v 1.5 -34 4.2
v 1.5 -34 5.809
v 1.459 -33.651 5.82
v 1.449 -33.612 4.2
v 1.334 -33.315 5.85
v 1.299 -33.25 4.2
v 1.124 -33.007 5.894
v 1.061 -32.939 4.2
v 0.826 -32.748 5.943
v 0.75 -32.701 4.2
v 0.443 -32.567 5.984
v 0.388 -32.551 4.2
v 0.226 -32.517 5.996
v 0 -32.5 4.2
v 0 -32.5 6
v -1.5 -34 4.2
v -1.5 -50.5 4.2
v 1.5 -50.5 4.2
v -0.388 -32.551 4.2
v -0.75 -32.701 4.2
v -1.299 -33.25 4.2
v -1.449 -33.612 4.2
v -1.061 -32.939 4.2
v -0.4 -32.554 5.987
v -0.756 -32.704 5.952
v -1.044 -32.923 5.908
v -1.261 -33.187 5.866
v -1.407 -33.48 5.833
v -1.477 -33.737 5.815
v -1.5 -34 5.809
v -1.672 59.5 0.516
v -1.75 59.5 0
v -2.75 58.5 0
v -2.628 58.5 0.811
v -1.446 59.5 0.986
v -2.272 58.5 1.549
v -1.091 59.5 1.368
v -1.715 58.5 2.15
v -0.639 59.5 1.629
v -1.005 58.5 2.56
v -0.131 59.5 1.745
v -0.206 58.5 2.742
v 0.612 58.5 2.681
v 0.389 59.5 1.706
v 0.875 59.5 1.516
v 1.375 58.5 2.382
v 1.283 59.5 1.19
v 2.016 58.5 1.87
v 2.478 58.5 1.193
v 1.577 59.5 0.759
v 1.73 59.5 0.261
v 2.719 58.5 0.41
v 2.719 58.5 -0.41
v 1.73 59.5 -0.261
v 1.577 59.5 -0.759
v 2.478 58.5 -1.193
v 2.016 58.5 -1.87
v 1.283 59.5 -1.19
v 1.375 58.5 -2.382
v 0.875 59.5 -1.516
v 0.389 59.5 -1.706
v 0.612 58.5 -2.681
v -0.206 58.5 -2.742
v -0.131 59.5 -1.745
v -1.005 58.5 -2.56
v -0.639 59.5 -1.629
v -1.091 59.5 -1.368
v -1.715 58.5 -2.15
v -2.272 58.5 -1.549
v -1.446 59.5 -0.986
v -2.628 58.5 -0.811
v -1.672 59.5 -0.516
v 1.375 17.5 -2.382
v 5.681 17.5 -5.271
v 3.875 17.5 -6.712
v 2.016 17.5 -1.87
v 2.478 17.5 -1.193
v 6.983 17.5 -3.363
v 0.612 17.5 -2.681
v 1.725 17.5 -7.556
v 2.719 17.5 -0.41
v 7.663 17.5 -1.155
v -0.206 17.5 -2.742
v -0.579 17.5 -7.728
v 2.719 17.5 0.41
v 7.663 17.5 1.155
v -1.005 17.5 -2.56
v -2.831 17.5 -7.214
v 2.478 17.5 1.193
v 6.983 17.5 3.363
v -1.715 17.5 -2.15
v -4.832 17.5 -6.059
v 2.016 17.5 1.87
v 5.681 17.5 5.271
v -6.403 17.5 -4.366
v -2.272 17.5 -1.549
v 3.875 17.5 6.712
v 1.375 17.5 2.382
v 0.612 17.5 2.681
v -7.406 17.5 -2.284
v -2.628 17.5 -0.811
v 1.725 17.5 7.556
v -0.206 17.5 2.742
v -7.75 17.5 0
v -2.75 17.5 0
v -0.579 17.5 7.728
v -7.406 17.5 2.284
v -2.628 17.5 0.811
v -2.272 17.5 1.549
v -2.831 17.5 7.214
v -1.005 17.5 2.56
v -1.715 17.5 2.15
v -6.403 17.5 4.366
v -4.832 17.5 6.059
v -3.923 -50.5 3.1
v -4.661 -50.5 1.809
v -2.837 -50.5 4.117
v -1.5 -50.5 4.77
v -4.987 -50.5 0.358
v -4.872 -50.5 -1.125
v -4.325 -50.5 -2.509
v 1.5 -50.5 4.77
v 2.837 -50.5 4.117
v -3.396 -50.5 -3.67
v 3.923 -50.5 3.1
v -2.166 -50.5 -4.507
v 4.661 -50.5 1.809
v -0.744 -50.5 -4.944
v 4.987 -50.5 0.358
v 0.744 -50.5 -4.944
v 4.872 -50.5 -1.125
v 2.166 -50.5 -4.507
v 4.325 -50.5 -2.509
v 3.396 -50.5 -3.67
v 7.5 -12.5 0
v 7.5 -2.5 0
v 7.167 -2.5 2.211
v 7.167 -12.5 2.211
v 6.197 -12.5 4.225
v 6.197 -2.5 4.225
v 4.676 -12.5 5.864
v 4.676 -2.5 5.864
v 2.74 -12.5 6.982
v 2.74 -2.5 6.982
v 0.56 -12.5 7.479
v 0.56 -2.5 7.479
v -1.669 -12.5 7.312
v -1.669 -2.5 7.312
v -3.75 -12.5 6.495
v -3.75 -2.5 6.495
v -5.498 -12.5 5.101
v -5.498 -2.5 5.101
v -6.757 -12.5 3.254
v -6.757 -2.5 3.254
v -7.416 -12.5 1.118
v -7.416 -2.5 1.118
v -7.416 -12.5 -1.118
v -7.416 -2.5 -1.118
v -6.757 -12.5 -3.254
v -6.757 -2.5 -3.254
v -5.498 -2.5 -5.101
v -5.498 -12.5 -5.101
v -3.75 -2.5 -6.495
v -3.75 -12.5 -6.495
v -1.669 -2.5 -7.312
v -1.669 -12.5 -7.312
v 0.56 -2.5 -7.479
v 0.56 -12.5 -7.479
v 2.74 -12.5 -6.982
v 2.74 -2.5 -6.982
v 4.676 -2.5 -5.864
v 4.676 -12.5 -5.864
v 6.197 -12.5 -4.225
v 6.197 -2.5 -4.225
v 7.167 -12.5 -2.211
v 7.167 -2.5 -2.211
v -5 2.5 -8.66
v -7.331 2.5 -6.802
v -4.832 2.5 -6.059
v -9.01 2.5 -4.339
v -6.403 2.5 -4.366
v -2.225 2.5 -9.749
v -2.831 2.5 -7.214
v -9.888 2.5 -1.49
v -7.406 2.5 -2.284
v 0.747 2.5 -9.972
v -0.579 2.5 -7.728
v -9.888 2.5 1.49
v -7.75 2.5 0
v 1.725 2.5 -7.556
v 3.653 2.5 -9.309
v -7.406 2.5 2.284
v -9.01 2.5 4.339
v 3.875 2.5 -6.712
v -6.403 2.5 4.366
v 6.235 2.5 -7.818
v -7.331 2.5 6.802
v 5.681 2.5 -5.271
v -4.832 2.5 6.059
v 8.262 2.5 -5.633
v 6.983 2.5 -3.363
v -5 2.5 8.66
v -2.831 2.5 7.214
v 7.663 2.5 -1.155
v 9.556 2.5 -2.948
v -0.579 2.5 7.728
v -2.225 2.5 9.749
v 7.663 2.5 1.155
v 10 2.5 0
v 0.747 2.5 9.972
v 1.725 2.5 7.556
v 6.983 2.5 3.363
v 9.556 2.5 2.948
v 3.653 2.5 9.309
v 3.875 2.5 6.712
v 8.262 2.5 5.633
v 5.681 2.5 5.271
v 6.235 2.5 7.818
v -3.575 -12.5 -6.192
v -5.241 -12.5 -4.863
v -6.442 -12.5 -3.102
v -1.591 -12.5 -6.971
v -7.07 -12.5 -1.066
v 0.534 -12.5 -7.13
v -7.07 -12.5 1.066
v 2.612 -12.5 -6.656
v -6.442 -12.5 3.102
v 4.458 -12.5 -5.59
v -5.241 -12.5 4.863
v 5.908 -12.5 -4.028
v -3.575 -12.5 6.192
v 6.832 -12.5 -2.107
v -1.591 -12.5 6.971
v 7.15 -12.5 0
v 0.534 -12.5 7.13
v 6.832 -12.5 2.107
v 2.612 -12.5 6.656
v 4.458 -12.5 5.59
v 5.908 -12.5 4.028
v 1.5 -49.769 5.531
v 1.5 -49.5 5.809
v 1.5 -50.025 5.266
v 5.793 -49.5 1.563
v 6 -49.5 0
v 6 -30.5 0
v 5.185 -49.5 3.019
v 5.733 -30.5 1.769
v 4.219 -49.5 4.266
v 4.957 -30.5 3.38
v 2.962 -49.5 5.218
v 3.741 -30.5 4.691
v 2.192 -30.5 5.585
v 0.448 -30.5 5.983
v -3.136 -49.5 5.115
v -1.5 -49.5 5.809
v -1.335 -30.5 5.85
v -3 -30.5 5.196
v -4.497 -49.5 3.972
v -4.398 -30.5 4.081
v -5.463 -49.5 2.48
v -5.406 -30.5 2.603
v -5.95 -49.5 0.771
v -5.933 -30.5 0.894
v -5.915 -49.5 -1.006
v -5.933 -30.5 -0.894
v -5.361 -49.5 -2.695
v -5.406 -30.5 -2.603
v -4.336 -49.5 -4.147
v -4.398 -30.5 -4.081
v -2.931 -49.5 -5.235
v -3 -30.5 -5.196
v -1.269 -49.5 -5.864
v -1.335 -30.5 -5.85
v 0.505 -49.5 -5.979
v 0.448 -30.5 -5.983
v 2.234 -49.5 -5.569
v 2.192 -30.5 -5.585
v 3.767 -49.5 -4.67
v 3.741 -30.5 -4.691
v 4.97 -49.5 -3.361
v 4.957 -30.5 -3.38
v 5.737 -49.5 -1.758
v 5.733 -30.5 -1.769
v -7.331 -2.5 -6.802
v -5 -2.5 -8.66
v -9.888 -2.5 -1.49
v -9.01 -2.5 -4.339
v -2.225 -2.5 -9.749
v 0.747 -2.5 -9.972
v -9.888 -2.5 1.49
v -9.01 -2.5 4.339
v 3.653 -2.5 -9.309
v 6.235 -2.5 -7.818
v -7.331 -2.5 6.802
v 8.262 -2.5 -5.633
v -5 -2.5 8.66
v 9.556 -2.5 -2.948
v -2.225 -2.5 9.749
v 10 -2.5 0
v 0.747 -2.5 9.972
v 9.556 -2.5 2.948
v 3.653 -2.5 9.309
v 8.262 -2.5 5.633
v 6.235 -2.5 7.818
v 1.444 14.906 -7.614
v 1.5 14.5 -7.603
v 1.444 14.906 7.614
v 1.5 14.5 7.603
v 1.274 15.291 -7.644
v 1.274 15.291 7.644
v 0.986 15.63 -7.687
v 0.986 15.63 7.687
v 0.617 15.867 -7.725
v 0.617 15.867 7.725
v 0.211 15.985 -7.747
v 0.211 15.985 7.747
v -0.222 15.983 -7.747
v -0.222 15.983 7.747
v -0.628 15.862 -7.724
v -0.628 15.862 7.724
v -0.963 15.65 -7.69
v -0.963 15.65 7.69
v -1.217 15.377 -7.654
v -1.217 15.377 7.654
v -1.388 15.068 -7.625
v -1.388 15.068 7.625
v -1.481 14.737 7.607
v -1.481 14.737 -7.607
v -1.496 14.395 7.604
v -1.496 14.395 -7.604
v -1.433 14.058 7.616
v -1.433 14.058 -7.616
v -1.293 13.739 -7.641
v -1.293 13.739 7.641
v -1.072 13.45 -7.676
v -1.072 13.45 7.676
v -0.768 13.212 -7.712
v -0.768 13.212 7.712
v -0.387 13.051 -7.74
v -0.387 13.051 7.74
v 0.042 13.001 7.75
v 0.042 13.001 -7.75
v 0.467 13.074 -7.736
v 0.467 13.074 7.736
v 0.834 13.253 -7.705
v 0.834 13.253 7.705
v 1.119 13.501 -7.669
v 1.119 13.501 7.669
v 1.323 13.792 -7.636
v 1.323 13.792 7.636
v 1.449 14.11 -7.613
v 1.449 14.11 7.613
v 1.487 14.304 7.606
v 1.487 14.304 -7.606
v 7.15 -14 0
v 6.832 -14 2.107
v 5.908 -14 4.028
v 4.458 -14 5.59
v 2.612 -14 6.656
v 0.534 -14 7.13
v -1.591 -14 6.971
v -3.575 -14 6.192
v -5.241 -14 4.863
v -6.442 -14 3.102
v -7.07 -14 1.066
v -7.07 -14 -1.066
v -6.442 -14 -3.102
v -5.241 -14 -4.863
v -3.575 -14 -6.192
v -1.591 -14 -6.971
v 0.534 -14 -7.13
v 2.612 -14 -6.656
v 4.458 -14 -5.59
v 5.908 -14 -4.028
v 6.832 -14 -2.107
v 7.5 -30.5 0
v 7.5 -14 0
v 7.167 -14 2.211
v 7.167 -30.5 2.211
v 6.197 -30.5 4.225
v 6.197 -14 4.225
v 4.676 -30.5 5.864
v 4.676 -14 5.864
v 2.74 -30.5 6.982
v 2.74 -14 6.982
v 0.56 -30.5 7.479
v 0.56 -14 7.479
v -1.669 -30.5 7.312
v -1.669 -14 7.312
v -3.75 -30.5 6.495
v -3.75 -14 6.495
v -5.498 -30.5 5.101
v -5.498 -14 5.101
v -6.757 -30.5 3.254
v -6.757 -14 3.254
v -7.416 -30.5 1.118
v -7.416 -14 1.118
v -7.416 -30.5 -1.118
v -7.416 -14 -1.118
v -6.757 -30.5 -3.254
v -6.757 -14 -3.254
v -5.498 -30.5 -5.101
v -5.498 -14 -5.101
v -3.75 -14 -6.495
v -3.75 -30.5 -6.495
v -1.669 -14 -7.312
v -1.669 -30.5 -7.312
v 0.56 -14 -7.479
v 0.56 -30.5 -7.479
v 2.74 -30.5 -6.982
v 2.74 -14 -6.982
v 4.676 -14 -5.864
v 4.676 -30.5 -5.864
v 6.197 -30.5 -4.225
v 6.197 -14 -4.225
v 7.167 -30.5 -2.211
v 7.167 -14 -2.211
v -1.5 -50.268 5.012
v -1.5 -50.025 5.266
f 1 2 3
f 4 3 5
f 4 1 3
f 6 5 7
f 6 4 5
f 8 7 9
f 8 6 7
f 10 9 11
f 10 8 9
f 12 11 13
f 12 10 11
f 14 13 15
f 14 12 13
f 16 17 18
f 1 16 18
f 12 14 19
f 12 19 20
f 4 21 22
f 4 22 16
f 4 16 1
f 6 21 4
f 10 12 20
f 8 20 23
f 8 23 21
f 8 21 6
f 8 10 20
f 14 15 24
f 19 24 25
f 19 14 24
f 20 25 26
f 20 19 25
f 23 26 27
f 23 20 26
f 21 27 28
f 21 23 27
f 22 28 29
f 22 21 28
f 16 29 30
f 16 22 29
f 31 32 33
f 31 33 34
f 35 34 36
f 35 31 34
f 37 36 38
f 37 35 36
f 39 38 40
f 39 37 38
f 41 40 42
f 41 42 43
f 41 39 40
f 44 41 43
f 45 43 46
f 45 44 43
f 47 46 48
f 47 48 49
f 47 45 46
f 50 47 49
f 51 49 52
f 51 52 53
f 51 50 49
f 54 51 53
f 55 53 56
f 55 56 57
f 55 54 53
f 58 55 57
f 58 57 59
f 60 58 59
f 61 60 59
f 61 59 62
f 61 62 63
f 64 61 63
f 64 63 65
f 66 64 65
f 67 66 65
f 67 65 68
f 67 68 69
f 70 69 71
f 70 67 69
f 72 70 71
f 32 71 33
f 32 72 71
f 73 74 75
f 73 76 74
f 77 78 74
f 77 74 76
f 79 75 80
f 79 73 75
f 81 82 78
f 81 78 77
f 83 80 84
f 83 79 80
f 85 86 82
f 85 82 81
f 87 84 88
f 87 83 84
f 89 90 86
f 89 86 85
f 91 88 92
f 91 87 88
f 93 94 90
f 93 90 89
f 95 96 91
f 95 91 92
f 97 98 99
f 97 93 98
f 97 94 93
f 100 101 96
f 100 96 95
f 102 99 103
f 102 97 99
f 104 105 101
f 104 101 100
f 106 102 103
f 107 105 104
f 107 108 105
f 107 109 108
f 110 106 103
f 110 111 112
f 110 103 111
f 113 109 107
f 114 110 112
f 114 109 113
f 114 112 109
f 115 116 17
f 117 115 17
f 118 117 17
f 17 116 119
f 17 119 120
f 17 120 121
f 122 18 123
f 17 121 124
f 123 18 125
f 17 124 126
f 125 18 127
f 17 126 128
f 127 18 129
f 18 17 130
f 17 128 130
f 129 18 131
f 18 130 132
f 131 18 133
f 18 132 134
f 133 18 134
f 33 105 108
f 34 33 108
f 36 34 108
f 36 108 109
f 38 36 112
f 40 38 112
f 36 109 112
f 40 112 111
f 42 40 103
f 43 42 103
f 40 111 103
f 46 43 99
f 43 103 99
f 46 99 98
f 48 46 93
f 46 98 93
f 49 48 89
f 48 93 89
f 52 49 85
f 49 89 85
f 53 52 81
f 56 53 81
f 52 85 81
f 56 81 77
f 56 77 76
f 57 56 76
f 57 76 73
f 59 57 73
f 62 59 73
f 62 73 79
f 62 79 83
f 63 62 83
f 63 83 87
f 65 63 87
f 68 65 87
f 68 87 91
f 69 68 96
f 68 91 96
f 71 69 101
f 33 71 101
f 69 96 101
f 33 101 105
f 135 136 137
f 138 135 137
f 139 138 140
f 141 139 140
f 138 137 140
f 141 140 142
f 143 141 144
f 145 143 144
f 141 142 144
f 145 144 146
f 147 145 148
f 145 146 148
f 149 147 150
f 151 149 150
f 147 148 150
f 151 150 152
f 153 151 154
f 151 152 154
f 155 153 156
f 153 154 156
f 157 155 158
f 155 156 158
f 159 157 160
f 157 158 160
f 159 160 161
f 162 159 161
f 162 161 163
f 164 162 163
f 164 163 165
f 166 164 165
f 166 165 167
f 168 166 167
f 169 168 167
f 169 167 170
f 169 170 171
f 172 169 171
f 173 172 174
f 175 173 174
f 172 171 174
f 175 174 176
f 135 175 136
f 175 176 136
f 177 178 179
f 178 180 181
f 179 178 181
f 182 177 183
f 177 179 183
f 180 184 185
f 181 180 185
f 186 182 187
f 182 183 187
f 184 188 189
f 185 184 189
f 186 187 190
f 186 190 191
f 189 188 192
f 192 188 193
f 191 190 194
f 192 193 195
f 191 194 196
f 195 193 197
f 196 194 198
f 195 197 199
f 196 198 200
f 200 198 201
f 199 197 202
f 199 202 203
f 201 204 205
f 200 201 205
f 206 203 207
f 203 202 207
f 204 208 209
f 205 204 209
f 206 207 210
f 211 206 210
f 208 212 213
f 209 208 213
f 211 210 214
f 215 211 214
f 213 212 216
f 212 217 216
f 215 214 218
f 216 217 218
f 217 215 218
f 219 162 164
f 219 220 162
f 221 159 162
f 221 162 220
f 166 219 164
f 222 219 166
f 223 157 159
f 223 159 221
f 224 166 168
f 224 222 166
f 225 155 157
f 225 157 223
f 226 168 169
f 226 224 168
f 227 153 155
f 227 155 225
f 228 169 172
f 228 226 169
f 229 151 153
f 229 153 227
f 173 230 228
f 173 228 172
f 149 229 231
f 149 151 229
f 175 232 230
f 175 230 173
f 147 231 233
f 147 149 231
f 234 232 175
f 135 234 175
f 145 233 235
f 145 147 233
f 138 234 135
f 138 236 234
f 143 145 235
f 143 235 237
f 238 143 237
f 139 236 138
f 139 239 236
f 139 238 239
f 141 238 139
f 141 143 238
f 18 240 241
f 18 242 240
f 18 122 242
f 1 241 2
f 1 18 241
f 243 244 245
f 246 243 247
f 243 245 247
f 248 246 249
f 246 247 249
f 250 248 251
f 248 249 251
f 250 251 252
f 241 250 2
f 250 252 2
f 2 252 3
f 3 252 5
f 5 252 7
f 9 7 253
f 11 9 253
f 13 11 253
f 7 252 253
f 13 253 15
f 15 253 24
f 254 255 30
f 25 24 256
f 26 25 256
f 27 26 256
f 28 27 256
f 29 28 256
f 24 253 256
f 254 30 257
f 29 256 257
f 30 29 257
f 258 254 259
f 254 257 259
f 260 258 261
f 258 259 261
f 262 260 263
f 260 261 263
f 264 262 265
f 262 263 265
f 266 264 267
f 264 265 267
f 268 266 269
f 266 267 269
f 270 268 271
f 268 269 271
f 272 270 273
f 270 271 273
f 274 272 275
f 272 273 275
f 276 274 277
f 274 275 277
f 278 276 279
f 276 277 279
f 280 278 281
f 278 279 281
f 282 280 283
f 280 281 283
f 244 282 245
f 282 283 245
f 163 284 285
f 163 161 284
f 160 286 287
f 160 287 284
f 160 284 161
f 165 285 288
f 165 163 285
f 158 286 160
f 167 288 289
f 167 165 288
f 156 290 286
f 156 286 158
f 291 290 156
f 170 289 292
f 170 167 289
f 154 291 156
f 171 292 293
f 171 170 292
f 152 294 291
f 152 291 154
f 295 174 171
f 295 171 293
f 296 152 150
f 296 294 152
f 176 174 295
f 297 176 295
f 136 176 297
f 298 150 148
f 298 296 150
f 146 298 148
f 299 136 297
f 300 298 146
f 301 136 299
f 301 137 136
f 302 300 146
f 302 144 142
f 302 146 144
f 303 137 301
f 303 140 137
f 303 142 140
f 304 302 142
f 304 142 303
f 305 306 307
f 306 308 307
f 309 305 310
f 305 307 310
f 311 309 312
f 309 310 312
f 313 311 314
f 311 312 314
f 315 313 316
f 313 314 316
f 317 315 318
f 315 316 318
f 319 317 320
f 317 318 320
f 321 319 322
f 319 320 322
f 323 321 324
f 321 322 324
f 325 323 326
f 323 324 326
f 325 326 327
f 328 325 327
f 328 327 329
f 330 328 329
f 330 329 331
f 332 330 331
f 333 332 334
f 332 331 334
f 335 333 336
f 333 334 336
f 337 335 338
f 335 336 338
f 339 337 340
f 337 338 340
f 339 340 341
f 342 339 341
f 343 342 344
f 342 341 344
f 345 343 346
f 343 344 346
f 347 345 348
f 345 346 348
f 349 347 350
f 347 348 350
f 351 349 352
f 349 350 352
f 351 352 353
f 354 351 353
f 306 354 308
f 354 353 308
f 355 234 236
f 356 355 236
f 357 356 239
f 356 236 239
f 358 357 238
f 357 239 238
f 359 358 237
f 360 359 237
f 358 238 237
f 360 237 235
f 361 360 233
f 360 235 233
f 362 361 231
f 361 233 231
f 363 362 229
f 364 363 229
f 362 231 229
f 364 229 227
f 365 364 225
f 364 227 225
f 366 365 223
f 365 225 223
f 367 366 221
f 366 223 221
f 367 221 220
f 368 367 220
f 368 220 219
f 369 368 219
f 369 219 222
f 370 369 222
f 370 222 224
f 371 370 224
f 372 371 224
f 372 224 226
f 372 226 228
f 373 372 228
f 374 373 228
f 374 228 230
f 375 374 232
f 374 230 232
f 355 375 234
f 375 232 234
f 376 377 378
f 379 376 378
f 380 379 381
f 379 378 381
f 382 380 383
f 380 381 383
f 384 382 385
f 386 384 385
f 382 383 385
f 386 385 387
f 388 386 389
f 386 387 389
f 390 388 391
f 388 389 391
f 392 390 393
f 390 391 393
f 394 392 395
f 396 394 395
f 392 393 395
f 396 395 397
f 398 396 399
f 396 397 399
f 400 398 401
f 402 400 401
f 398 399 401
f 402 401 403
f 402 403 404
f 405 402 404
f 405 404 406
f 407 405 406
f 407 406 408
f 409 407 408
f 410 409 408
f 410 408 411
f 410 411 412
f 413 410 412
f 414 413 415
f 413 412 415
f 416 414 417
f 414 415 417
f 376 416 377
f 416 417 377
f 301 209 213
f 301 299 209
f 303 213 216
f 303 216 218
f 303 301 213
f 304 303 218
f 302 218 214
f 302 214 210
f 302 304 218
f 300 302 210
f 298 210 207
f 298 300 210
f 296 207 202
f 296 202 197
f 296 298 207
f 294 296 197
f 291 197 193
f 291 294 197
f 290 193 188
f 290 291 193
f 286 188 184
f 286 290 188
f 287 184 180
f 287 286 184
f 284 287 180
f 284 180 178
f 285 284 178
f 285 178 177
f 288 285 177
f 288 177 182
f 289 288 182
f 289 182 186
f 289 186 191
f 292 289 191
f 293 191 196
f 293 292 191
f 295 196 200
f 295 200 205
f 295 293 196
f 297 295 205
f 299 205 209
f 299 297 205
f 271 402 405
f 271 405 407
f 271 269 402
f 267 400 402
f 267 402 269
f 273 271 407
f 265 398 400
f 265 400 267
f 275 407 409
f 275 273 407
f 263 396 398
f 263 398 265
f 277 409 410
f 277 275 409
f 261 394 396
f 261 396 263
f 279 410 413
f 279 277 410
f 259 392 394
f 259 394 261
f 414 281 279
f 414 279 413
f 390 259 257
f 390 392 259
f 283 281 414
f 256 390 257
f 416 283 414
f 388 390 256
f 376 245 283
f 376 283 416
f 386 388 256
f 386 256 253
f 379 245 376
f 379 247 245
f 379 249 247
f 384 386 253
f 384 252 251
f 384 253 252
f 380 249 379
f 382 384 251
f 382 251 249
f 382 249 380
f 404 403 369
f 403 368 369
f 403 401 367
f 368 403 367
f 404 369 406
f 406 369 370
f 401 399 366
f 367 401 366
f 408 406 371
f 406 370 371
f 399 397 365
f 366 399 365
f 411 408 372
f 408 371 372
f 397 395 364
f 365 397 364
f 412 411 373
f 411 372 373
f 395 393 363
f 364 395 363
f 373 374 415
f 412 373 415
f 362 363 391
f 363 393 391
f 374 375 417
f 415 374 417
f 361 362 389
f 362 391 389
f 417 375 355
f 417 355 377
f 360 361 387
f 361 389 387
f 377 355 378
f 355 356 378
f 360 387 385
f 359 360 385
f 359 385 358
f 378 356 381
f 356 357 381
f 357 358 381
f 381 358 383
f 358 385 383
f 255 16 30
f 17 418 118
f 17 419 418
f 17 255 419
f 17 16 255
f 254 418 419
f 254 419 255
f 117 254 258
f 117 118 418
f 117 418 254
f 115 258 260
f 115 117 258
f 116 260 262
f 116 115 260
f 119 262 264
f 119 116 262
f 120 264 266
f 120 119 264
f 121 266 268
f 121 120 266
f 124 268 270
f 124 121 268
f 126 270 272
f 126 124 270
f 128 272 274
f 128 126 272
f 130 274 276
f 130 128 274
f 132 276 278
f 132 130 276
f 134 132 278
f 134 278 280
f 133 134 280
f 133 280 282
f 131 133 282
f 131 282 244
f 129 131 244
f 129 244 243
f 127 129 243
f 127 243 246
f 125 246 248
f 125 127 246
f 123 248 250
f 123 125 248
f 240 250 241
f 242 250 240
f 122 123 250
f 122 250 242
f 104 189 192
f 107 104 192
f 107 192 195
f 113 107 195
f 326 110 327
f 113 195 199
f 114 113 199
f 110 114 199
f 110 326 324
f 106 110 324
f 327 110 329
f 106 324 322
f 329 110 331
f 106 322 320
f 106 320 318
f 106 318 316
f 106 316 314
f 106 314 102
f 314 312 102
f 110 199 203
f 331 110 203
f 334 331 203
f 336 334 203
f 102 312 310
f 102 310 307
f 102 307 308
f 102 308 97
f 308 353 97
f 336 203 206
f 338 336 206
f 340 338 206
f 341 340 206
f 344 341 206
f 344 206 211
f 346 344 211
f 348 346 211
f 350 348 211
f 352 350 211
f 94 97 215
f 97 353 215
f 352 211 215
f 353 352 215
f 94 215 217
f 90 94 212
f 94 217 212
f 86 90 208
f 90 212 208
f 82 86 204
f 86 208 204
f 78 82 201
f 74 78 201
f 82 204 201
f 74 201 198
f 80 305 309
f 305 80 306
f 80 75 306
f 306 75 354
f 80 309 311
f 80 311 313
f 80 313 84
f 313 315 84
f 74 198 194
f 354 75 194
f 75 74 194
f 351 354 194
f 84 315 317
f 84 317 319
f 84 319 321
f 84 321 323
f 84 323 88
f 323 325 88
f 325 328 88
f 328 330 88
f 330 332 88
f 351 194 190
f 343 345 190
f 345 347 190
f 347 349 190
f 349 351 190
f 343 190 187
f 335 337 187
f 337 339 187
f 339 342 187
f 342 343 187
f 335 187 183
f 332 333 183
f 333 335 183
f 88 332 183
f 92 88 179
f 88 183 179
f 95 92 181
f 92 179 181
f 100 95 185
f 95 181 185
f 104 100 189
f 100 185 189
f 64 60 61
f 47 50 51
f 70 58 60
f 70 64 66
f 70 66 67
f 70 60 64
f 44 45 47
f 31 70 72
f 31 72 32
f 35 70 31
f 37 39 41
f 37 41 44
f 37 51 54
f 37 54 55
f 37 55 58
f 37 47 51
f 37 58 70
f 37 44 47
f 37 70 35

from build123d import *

# Parameters (mm, degrees)
F0_R      = 10
F1_DEPTH  = 2.5
F2_R      = 7.5
F3_DEPTH  = 10
F4_R      = 7.15
F5_DEPTH  = 1.5
F6_R      = 7.5
F7_DEPTH  = 16.5
F8_R      = 6
F9_DEPTH  = 20
F10_SIZE  = 1
F11_R     = 7.75
F12_DEPTH = 15
F13_R     = 2.75
F14_DEPTH = 42
F15_SIZE  = 1
F16_R     = 1.5
F17_DEPTH = 12.5
F19_DEPTH = 6
F20_DEPTH = 4.2


with BuildPart() as f1:
    # F0 (on Front) → F1 (new body, symmetric)
    with BuildSketch(Plane.XZ):
        Circle(F0_R)
    extrude(amount=F1_DEPTH, both=True)

    # F2 (on face) → F3 (join)
    with BuildSketch(Plane.XZ.offset(2.5)):
        Circle(F2_R)
    extrude(amount=F3_DEPTH)

    # F4 (on face) → F5 (join)
    with BuildSketch(Plane.XZ.offset(12.5)):
        Circle(F4_R)
    extrude(amount=F5_DEPTH)

    # F6 (on face) → F7 (join)
    with BuildSketch(Plane.XZ.offset(14)):
        Circle(F6_R)
    extrude(amount=F7_DEPTH)

    # F8 (on face) → F9 (join)
    with BuildSketch(Plane.XZ.offset(30.5)):
        Circle(F8_R)
    extrude(amount=F9_DEPTH)

    # F10
    f10_edges = [f1.edges().sort_by_distance(p)[0] for p in [
        (-6, -50.5, 0),
    ]]
    chamfer(f10_edges, length=F10_SIZE)

    # F11 (on face) → F12 (join)
    with BuildSketch(Plane(origin=(0, 2.5, 0), x_dir=(-1, 0, 0), z_dir=(0, 1, 0))):
        Circle(F11_R)
    extrude(amount=F12_DEPTH)

    # F13 (on face) → F14 (join)
    with BuildSketch(Plane(origin=(0, 17.5, 0), x_dir=(-1, 0, 0), z_dir=(0, 1, 0))):
        Circle(F13_R)
    extrude(amount=F14_DEPTH)

    # F15
    f15_edges = [f1.edges().sort_by_distance(p)[0] for p in [
        (2.75, 59.5, 0),
    ]]
    chamfer(f15_edges, length=F15_SIZE)

    # F16 (on Top) → F17 (cut, symmetric)
    with BuildSketch(Plane.XY):
        with Locations((0, 14.5)):
            Circle(F16_R)
    extrude(amount=F17_DEPTH, both=True, mode=Mode.SUBTRACT)

    # F18 (on Top) → F19 (cut)
    with BuildSketch(Plane.XY):
        with BuildLine():
            Line((-1.5, -34), (-1.5, -50.5))
            Line((-1.5, -50.5), (1.5, -50.5))
            Line((1.5, -50.5), (1.5, -34))
            ThreePointArc((1.5, -34), (1.06066, -32.93934), (0, -32.5))
            ThreePointArc((0, -32.5), (-1.06066, -32.93934), (-1.5, -34))
        make_face()
    extrude(amount=F19_DEPTH, mode=Mode.SUBTRACT)

    # F18 (on Top) → F20 (join)
    with BuildSketch(Plane.XY):
        with BuildLine():
            Line((-1.5, -34), (-1.5, -50.5))
            Line((-1.5, -50.5), (1.5, -50.5))
            Line((1.5, -50.5), (1.5, -34))
            ThreePointArc((1.5, -34), (1.06066, -32.93934), (0, -32.5))
            ThreePointArc((0, -32.5), (-1.06066, -32.93934), (-1.5, -34))
        make_face()
    extrude(amount=F20_DEPTH)


solid = f1.part
